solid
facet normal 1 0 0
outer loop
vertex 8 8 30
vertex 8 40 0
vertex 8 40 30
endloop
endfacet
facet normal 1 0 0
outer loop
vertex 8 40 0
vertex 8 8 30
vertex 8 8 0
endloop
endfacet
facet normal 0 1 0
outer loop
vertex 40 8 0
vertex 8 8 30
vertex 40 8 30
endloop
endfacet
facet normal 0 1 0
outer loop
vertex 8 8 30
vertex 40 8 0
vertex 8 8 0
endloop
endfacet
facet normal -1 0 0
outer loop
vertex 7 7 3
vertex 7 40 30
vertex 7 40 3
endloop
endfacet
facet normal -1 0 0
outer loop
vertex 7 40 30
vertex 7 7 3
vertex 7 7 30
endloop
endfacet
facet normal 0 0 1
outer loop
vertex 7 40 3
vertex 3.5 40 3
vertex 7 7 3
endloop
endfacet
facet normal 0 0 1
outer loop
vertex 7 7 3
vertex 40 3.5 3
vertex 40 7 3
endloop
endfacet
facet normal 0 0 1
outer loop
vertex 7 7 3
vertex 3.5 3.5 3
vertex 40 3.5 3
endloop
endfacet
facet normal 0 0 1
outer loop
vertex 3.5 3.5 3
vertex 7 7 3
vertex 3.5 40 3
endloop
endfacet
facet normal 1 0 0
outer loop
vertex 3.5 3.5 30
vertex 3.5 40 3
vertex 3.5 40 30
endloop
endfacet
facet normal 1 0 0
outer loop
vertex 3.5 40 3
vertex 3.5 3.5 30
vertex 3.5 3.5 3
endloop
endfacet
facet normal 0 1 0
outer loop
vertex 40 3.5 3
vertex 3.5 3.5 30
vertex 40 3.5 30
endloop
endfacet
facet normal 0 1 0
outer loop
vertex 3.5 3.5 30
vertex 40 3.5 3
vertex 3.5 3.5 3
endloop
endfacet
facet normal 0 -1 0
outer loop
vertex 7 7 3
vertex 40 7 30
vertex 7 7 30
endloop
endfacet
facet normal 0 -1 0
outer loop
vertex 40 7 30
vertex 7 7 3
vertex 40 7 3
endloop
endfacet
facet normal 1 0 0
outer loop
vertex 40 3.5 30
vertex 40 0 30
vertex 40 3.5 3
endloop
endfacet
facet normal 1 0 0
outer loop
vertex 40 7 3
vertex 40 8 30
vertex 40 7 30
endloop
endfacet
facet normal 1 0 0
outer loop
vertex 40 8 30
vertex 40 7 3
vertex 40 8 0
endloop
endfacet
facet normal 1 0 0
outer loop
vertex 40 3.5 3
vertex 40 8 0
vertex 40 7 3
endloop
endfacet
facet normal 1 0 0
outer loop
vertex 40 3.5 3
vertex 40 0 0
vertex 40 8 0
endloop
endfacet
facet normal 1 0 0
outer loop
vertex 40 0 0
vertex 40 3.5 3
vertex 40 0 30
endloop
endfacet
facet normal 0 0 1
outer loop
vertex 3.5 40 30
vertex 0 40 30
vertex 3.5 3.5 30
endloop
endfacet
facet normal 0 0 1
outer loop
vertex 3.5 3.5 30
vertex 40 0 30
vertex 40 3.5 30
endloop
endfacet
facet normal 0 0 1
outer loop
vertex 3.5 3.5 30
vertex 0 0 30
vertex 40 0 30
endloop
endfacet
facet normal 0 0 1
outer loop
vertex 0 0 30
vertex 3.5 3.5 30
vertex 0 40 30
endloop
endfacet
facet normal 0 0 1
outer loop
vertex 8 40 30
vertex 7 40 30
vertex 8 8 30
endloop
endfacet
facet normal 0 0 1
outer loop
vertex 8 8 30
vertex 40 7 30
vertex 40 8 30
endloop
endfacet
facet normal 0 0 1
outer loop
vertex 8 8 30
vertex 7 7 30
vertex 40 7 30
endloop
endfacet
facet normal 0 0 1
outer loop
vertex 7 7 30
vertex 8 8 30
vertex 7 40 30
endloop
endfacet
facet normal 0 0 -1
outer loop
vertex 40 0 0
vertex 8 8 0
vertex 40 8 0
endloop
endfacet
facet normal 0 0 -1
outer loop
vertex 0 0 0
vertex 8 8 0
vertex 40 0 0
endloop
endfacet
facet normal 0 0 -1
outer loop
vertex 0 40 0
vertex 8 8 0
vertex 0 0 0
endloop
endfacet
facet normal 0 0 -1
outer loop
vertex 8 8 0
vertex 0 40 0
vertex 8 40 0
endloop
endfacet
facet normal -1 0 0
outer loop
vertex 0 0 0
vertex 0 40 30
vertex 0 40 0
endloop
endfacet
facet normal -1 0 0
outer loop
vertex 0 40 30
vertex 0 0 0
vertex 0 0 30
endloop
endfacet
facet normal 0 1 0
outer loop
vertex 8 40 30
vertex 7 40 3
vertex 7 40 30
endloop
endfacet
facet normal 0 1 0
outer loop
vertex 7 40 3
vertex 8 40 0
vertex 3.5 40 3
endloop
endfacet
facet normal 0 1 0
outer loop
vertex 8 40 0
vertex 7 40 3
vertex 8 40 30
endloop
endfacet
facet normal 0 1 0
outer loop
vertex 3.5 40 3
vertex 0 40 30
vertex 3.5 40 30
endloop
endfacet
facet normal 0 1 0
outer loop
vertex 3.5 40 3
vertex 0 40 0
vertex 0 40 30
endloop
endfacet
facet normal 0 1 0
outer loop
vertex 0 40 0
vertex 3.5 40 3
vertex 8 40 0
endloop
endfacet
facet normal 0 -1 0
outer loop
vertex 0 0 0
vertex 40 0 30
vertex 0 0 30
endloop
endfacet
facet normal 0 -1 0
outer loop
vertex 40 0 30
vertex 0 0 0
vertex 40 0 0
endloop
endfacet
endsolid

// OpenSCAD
module bracket(height,sheet_width)
{
	difference()
	{
		union()
		{
			cube([40,40,height]);

		}
		union()
		{
			translate([5+sheet_width,5+sheet_width,-1]) cube([40,40,height+10]);
			//gives the basic angle bracket shape
				
			translate([sheet_width+0.5,sheet_width+0.5,3]) cube ([sheet_width+0.5,40,height]);
			translate([sheet_width+0.5,sheet_width+0.5,3]) cube ([40,sheet_width+0.5,height]);
		}
	}
}

bracket(30,3);
